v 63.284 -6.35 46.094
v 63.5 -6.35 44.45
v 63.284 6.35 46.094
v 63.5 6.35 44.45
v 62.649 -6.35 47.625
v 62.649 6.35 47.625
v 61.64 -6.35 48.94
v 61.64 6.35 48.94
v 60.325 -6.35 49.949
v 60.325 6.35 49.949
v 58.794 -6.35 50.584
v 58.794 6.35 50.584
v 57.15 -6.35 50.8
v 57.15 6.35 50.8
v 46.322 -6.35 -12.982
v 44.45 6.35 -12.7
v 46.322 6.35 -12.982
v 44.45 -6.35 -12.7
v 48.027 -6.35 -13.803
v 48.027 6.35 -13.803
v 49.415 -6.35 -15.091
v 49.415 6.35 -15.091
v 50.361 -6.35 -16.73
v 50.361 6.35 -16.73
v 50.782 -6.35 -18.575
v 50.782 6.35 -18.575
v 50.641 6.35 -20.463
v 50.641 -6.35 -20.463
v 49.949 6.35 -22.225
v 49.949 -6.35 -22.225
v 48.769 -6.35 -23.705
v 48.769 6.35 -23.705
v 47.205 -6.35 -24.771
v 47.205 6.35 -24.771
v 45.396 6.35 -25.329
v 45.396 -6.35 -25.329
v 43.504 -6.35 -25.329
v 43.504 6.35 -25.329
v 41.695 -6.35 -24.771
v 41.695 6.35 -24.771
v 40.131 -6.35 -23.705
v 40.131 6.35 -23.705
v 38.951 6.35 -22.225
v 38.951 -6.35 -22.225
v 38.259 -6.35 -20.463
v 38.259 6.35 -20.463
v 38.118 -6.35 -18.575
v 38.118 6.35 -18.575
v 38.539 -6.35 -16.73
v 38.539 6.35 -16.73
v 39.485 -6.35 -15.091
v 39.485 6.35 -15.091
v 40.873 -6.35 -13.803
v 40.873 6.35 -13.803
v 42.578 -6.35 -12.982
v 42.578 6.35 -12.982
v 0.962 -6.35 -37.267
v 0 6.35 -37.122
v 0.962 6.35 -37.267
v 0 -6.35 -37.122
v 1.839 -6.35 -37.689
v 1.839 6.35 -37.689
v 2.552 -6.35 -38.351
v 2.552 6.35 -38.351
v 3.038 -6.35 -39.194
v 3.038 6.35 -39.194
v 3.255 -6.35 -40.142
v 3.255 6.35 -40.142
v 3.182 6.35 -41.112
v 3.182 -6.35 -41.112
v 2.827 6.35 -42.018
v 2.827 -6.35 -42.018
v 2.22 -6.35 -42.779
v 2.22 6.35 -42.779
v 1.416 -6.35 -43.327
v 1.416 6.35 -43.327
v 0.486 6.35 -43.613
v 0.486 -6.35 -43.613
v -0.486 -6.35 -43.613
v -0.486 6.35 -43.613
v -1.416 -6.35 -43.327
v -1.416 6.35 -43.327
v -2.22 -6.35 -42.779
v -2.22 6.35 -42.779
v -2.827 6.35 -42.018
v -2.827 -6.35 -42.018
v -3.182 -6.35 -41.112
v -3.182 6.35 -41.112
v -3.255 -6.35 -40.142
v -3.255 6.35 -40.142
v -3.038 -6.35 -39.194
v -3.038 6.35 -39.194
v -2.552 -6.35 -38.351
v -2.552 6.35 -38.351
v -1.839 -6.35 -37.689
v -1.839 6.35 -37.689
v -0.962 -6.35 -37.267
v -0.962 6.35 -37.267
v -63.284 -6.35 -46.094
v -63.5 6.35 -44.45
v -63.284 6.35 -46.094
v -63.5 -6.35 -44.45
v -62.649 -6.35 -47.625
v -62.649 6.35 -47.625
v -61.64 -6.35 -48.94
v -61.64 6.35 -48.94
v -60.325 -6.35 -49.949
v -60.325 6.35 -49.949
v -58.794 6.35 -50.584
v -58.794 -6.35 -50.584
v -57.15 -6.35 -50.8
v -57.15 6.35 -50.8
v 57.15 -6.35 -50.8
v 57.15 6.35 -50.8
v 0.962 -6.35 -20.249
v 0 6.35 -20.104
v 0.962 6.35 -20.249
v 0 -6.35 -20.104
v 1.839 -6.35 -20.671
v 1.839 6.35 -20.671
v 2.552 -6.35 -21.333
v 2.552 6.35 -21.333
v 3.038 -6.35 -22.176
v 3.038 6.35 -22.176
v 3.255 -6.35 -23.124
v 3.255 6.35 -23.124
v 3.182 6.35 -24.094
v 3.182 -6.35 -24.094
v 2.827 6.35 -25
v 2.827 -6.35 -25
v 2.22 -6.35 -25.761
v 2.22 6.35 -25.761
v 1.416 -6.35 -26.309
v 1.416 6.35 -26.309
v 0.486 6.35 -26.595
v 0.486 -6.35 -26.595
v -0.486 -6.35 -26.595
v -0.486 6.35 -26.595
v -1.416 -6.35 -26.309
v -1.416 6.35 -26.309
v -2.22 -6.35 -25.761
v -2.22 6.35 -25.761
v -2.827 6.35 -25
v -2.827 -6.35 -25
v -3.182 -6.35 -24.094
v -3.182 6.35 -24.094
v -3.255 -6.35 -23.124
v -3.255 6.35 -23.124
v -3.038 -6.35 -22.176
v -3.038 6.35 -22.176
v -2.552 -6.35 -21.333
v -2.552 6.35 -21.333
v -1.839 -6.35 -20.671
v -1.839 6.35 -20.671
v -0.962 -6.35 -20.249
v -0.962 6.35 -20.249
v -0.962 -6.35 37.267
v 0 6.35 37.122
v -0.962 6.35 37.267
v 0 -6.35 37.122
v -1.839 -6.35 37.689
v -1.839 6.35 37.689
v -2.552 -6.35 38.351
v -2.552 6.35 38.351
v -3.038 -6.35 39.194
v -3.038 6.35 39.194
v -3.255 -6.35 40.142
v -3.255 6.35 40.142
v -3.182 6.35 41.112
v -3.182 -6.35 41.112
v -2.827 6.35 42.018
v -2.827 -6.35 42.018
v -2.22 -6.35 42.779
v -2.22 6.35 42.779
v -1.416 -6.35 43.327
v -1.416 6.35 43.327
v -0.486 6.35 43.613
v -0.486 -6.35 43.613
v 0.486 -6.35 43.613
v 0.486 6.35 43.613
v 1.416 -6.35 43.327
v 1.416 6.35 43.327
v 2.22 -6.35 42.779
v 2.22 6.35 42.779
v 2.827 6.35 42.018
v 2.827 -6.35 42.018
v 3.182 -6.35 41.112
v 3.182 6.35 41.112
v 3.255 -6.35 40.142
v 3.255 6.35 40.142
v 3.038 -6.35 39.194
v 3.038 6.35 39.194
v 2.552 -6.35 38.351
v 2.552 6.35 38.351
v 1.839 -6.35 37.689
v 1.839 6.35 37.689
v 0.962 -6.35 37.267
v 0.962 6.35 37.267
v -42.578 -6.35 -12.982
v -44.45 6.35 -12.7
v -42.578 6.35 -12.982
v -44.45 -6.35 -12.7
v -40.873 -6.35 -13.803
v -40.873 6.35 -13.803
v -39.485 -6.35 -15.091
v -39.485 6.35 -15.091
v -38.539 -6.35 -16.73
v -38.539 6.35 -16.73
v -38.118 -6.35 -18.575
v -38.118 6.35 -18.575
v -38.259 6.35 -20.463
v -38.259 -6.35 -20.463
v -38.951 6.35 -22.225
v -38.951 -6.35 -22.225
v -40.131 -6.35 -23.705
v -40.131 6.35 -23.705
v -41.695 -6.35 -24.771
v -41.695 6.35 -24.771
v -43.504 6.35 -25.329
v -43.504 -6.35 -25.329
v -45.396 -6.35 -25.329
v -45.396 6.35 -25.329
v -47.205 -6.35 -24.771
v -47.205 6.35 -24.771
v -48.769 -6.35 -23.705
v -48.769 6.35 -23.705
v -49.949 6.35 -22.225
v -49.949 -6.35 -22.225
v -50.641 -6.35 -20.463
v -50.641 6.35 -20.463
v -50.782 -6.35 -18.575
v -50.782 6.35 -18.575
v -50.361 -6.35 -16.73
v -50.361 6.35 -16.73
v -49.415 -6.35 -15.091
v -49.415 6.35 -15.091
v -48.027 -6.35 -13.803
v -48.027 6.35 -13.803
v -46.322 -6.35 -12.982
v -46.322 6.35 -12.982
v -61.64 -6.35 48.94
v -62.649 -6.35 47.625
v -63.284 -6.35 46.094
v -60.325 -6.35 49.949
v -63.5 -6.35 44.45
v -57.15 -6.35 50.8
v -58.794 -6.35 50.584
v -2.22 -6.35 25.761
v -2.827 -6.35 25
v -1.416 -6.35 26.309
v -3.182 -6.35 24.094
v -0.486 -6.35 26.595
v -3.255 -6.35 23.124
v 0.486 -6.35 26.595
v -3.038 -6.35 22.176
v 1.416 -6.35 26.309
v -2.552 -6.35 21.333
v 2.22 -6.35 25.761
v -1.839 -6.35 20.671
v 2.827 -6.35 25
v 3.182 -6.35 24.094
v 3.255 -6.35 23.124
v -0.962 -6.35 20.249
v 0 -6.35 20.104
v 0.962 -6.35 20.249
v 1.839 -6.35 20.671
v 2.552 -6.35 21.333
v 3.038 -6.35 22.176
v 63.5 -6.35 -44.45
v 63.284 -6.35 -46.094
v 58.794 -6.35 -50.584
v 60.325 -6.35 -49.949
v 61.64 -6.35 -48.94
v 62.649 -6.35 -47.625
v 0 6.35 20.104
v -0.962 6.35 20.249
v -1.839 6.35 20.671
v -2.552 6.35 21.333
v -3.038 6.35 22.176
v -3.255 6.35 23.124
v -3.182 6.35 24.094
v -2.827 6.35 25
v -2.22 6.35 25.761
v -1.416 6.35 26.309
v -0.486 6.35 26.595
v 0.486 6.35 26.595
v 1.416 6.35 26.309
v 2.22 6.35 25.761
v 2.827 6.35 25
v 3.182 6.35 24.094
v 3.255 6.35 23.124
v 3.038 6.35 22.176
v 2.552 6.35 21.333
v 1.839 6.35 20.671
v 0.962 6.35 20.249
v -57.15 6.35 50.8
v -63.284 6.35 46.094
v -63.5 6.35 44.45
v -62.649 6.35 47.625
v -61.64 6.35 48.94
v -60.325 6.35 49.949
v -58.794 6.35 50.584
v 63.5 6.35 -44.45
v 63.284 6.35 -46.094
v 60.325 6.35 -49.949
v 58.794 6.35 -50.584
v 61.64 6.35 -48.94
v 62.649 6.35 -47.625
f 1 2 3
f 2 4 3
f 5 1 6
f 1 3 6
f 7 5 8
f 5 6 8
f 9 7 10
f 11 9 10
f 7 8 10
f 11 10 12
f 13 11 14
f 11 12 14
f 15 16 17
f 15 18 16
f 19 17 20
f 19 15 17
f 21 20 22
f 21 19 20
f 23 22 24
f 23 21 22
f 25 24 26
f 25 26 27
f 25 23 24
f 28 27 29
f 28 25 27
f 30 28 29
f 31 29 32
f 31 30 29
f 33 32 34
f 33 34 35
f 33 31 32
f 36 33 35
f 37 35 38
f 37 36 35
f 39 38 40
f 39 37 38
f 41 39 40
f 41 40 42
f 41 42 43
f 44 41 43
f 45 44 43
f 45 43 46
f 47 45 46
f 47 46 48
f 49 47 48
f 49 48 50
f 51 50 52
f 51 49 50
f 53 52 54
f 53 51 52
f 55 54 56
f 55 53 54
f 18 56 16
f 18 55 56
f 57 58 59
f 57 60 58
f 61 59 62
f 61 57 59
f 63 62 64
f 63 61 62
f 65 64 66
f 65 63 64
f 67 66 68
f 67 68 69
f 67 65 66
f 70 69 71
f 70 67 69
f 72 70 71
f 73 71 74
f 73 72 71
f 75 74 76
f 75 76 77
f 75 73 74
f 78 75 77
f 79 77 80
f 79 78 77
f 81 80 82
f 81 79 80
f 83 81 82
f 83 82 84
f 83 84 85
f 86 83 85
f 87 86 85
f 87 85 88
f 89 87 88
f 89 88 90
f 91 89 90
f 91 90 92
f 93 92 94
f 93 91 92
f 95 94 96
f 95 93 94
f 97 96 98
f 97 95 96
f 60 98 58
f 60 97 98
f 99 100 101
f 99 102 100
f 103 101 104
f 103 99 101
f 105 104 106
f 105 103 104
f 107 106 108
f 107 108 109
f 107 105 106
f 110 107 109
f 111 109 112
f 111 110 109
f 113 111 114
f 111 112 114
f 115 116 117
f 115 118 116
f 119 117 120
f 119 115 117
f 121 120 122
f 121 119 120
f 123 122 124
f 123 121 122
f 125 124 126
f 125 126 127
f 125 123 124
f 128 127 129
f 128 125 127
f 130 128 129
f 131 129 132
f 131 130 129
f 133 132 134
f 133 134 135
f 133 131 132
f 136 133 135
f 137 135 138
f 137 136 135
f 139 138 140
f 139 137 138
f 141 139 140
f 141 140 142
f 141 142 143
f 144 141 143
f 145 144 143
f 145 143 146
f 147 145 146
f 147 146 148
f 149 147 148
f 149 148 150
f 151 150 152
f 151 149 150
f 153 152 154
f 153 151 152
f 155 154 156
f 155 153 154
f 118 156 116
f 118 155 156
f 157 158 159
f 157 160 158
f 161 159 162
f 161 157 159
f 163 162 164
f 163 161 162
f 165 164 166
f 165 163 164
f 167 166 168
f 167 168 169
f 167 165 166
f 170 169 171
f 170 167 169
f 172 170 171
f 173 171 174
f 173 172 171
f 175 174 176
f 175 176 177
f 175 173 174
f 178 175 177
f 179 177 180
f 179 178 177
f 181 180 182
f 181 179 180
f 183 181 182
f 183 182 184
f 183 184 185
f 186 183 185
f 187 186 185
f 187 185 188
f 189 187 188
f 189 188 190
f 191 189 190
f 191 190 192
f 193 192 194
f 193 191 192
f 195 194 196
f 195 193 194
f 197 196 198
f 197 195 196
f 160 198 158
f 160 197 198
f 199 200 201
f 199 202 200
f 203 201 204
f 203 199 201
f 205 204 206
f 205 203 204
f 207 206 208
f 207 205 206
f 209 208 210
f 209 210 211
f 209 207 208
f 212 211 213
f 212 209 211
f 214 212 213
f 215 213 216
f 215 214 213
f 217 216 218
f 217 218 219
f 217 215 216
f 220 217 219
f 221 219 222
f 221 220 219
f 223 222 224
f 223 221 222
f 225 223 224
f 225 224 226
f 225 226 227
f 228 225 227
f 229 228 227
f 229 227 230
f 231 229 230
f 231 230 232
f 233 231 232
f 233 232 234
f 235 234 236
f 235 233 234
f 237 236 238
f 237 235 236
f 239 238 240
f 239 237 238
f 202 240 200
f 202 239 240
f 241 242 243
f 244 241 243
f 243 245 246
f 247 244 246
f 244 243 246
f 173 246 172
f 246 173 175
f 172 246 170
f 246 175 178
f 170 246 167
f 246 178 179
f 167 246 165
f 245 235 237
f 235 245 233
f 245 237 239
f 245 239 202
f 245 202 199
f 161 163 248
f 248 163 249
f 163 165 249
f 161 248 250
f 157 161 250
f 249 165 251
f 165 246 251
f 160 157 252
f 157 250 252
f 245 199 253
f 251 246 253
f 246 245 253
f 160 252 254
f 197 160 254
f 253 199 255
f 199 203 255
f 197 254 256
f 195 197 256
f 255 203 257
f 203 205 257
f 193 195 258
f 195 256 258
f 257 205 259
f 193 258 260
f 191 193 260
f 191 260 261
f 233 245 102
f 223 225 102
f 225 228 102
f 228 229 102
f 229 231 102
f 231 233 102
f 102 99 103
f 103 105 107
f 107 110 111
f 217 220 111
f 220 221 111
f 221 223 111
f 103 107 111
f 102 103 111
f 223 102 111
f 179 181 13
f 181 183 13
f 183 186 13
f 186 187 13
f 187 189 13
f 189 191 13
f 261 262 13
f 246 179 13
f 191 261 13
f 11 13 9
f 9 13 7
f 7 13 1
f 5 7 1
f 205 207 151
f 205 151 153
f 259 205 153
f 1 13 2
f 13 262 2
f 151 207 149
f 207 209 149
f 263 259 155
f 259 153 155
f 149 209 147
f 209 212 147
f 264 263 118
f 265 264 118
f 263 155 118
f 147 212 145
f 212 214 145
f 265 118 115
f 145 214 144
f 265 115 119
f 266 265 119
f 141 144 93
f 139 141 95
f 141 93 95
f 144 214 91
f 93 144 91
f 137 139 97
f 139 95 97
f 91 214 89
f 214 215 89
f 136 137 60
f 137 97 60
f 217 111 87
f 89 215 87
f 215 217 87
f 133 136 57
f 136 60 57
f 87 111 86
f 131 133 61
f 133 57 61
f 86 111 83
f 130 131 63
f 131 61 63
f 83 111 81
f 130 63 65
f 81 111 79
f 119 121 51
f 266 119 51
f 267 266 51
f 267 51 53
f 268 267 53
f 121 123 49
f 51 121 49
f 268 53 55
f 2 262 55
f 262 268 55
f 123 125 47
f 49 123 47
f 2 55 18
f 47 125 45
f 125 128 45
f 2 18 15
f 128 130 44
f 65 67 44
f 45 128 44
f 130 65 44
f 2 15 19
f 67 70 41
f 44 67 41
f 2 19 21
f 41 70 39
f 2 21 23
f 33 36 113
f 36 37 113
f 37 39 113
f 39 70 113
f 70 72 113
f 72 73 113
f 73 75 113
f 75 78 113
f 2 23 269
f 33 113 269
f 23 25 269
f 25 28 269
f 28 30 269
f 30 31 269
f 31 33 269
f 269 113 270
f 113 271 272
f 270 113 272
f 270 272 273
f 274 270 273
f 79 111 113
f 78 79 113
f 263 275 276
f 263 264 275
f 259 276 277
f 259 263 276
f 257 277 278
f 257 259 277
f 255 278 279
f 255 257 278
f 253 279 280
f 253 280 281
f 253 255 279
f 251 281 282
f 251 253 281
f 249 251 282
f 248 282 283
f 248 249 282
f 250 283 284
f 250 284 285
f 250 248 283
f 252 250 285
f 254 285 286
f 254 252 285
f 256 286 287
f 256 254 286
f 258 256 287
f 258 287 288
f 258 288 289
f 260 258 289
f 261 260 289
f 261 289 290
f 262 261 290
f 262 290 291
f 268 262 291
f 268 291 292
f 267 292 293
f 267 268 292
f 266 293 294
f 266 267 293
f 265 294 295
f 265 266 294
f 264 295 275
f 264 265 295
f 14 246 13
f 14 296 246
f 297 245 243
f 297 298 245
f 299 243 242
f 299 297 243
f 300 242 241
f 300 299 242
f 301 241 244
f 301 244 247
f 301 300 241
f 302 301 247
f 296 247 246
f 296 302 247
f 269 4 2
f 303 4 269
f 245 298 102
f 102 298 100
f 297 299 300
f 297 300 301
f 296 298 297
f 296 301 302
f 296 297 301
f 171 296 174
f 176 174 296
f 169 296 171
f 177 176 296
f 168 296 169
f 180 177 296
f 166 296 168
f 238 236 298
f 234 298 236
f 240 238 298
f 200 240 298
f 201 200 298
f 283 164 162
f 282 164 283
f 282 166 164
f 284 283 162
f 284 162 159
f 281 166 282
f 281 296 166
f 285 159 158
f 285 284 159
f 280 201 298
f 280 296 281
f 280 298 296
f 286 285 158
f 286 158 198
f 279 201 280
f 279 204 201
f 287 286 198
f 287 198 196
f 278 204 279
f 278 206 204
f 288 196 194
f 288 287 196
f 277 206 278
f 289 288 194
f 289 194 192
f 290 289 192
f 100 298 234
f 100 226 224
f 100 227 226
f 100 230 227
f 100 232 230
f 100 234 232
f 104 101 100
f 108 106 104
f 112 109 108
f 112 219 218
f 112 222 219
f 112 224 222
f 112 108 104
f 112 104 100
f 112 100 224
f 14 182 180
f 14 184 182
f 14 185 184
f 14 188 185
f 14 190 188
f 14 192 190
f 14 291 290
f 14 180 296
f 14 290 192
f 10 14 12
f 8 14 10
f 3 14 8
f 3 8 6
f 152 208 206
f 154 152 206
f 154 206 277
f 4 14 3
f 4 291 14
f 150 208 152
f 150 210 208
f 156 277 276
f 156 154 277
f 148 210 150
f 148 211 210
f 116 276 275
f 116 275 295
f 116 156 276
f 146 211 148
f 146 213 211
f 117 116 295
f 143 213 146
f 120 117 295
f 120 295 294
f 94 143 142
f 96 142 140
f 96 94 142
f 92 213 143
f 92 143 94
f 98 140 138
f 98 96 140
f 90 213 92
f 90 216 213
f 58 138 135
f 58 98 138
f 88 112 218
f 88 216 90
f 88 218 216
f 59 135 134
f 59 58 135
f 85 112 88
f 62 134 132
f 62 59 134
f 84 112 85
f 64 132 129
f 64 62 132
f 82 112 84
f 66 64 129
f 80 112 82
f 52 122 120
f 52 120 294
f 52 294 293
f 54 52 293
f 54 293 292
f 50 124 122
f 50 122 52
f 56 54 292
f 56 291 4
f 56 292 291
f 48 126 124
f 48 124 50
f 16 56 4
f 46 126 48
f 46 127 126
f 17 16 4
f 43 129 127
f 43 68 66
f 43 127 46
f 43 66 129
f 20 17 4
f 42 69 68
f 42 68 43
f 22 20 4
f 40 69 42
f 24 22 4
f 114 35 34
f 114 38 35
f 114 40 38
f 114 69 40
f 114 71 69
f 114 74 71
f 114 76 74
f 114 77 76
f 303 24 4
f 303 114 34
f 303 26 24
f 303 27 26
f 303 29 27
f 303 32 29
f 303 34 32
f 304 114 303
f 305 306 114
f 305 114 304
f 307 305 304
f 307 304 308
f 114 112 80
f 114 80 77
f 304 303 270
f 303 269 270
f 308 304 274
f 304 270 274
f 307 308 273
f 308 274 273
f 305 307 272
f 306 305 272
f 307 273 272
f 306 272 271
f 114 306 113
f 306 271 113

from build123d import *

# Parameters (mm, degrees)
SKETCH1_W           = 127
SKETCH1_H           = 101.6
SKETCH1_R           = 3.2639
SKETCH1_R_2         = 6.35
BOSS_EXTRUDE1_DEPTH = 6.35
FILLET1_R           = 6.35


with BuildPart() as part:
    # Sketch1 → Boss-Extrude1 (new, symmetric)
    with BuildSketch(Plane(origin=(0, 0, 0), x_dir=(1, 0, 0), z_dir=(0, 1, 0))):
        Rectangle(SKETCH1_W, SKETCH1_H)
        with Locations(Location((0, 23.368, 0), (0, 0, 270))):
            Circle(SKETCH1_R, mode=Mode.SUBTRACT)
        with Locations(Location((0, 40.386, 0), (0, 0, 270))):
            Circle(SKETCH1_R, mode=Mode.SUBTRACT)
        with Locations(Location((0, -23.368, 0), (0, 0, 90))):
            Circle(SKETCH1_R, mode=Mode.SUBTRACT)
        with Locations(Location((0, -40.386, 0), (0, 0, 90))):
            Circle(SKETCH1_R, mode=Mode.SUBTRACT)
        with Locations(Location((-44.45, 19.05, 0), (0, 0, 270))):
            Circle(SKETCH1_R_2, mode=Mode.SUBTRACT)
        with Locations(Location((44.45, 19.05, 0), (0, 0, 270))):
            Circle(SKETCH1_R_2, mode=Mode.SUBTRACT)
    extrude(amount=BOSS_EXTRUDE1_DEPTH, both=True)

    # Fillet1
    fillet1_edges = [part.edges().sort_by_distance(p)[0] for p in [
        (63.5, 0, 50.8),
        (-63.5, 0, 50.8),
        (-63.5, 0, -50.8),
        (63.5, 0, -50.8),
    ]]
    fillet(fillet1_edges, radius=FILLET1_R)


solid = part.part
